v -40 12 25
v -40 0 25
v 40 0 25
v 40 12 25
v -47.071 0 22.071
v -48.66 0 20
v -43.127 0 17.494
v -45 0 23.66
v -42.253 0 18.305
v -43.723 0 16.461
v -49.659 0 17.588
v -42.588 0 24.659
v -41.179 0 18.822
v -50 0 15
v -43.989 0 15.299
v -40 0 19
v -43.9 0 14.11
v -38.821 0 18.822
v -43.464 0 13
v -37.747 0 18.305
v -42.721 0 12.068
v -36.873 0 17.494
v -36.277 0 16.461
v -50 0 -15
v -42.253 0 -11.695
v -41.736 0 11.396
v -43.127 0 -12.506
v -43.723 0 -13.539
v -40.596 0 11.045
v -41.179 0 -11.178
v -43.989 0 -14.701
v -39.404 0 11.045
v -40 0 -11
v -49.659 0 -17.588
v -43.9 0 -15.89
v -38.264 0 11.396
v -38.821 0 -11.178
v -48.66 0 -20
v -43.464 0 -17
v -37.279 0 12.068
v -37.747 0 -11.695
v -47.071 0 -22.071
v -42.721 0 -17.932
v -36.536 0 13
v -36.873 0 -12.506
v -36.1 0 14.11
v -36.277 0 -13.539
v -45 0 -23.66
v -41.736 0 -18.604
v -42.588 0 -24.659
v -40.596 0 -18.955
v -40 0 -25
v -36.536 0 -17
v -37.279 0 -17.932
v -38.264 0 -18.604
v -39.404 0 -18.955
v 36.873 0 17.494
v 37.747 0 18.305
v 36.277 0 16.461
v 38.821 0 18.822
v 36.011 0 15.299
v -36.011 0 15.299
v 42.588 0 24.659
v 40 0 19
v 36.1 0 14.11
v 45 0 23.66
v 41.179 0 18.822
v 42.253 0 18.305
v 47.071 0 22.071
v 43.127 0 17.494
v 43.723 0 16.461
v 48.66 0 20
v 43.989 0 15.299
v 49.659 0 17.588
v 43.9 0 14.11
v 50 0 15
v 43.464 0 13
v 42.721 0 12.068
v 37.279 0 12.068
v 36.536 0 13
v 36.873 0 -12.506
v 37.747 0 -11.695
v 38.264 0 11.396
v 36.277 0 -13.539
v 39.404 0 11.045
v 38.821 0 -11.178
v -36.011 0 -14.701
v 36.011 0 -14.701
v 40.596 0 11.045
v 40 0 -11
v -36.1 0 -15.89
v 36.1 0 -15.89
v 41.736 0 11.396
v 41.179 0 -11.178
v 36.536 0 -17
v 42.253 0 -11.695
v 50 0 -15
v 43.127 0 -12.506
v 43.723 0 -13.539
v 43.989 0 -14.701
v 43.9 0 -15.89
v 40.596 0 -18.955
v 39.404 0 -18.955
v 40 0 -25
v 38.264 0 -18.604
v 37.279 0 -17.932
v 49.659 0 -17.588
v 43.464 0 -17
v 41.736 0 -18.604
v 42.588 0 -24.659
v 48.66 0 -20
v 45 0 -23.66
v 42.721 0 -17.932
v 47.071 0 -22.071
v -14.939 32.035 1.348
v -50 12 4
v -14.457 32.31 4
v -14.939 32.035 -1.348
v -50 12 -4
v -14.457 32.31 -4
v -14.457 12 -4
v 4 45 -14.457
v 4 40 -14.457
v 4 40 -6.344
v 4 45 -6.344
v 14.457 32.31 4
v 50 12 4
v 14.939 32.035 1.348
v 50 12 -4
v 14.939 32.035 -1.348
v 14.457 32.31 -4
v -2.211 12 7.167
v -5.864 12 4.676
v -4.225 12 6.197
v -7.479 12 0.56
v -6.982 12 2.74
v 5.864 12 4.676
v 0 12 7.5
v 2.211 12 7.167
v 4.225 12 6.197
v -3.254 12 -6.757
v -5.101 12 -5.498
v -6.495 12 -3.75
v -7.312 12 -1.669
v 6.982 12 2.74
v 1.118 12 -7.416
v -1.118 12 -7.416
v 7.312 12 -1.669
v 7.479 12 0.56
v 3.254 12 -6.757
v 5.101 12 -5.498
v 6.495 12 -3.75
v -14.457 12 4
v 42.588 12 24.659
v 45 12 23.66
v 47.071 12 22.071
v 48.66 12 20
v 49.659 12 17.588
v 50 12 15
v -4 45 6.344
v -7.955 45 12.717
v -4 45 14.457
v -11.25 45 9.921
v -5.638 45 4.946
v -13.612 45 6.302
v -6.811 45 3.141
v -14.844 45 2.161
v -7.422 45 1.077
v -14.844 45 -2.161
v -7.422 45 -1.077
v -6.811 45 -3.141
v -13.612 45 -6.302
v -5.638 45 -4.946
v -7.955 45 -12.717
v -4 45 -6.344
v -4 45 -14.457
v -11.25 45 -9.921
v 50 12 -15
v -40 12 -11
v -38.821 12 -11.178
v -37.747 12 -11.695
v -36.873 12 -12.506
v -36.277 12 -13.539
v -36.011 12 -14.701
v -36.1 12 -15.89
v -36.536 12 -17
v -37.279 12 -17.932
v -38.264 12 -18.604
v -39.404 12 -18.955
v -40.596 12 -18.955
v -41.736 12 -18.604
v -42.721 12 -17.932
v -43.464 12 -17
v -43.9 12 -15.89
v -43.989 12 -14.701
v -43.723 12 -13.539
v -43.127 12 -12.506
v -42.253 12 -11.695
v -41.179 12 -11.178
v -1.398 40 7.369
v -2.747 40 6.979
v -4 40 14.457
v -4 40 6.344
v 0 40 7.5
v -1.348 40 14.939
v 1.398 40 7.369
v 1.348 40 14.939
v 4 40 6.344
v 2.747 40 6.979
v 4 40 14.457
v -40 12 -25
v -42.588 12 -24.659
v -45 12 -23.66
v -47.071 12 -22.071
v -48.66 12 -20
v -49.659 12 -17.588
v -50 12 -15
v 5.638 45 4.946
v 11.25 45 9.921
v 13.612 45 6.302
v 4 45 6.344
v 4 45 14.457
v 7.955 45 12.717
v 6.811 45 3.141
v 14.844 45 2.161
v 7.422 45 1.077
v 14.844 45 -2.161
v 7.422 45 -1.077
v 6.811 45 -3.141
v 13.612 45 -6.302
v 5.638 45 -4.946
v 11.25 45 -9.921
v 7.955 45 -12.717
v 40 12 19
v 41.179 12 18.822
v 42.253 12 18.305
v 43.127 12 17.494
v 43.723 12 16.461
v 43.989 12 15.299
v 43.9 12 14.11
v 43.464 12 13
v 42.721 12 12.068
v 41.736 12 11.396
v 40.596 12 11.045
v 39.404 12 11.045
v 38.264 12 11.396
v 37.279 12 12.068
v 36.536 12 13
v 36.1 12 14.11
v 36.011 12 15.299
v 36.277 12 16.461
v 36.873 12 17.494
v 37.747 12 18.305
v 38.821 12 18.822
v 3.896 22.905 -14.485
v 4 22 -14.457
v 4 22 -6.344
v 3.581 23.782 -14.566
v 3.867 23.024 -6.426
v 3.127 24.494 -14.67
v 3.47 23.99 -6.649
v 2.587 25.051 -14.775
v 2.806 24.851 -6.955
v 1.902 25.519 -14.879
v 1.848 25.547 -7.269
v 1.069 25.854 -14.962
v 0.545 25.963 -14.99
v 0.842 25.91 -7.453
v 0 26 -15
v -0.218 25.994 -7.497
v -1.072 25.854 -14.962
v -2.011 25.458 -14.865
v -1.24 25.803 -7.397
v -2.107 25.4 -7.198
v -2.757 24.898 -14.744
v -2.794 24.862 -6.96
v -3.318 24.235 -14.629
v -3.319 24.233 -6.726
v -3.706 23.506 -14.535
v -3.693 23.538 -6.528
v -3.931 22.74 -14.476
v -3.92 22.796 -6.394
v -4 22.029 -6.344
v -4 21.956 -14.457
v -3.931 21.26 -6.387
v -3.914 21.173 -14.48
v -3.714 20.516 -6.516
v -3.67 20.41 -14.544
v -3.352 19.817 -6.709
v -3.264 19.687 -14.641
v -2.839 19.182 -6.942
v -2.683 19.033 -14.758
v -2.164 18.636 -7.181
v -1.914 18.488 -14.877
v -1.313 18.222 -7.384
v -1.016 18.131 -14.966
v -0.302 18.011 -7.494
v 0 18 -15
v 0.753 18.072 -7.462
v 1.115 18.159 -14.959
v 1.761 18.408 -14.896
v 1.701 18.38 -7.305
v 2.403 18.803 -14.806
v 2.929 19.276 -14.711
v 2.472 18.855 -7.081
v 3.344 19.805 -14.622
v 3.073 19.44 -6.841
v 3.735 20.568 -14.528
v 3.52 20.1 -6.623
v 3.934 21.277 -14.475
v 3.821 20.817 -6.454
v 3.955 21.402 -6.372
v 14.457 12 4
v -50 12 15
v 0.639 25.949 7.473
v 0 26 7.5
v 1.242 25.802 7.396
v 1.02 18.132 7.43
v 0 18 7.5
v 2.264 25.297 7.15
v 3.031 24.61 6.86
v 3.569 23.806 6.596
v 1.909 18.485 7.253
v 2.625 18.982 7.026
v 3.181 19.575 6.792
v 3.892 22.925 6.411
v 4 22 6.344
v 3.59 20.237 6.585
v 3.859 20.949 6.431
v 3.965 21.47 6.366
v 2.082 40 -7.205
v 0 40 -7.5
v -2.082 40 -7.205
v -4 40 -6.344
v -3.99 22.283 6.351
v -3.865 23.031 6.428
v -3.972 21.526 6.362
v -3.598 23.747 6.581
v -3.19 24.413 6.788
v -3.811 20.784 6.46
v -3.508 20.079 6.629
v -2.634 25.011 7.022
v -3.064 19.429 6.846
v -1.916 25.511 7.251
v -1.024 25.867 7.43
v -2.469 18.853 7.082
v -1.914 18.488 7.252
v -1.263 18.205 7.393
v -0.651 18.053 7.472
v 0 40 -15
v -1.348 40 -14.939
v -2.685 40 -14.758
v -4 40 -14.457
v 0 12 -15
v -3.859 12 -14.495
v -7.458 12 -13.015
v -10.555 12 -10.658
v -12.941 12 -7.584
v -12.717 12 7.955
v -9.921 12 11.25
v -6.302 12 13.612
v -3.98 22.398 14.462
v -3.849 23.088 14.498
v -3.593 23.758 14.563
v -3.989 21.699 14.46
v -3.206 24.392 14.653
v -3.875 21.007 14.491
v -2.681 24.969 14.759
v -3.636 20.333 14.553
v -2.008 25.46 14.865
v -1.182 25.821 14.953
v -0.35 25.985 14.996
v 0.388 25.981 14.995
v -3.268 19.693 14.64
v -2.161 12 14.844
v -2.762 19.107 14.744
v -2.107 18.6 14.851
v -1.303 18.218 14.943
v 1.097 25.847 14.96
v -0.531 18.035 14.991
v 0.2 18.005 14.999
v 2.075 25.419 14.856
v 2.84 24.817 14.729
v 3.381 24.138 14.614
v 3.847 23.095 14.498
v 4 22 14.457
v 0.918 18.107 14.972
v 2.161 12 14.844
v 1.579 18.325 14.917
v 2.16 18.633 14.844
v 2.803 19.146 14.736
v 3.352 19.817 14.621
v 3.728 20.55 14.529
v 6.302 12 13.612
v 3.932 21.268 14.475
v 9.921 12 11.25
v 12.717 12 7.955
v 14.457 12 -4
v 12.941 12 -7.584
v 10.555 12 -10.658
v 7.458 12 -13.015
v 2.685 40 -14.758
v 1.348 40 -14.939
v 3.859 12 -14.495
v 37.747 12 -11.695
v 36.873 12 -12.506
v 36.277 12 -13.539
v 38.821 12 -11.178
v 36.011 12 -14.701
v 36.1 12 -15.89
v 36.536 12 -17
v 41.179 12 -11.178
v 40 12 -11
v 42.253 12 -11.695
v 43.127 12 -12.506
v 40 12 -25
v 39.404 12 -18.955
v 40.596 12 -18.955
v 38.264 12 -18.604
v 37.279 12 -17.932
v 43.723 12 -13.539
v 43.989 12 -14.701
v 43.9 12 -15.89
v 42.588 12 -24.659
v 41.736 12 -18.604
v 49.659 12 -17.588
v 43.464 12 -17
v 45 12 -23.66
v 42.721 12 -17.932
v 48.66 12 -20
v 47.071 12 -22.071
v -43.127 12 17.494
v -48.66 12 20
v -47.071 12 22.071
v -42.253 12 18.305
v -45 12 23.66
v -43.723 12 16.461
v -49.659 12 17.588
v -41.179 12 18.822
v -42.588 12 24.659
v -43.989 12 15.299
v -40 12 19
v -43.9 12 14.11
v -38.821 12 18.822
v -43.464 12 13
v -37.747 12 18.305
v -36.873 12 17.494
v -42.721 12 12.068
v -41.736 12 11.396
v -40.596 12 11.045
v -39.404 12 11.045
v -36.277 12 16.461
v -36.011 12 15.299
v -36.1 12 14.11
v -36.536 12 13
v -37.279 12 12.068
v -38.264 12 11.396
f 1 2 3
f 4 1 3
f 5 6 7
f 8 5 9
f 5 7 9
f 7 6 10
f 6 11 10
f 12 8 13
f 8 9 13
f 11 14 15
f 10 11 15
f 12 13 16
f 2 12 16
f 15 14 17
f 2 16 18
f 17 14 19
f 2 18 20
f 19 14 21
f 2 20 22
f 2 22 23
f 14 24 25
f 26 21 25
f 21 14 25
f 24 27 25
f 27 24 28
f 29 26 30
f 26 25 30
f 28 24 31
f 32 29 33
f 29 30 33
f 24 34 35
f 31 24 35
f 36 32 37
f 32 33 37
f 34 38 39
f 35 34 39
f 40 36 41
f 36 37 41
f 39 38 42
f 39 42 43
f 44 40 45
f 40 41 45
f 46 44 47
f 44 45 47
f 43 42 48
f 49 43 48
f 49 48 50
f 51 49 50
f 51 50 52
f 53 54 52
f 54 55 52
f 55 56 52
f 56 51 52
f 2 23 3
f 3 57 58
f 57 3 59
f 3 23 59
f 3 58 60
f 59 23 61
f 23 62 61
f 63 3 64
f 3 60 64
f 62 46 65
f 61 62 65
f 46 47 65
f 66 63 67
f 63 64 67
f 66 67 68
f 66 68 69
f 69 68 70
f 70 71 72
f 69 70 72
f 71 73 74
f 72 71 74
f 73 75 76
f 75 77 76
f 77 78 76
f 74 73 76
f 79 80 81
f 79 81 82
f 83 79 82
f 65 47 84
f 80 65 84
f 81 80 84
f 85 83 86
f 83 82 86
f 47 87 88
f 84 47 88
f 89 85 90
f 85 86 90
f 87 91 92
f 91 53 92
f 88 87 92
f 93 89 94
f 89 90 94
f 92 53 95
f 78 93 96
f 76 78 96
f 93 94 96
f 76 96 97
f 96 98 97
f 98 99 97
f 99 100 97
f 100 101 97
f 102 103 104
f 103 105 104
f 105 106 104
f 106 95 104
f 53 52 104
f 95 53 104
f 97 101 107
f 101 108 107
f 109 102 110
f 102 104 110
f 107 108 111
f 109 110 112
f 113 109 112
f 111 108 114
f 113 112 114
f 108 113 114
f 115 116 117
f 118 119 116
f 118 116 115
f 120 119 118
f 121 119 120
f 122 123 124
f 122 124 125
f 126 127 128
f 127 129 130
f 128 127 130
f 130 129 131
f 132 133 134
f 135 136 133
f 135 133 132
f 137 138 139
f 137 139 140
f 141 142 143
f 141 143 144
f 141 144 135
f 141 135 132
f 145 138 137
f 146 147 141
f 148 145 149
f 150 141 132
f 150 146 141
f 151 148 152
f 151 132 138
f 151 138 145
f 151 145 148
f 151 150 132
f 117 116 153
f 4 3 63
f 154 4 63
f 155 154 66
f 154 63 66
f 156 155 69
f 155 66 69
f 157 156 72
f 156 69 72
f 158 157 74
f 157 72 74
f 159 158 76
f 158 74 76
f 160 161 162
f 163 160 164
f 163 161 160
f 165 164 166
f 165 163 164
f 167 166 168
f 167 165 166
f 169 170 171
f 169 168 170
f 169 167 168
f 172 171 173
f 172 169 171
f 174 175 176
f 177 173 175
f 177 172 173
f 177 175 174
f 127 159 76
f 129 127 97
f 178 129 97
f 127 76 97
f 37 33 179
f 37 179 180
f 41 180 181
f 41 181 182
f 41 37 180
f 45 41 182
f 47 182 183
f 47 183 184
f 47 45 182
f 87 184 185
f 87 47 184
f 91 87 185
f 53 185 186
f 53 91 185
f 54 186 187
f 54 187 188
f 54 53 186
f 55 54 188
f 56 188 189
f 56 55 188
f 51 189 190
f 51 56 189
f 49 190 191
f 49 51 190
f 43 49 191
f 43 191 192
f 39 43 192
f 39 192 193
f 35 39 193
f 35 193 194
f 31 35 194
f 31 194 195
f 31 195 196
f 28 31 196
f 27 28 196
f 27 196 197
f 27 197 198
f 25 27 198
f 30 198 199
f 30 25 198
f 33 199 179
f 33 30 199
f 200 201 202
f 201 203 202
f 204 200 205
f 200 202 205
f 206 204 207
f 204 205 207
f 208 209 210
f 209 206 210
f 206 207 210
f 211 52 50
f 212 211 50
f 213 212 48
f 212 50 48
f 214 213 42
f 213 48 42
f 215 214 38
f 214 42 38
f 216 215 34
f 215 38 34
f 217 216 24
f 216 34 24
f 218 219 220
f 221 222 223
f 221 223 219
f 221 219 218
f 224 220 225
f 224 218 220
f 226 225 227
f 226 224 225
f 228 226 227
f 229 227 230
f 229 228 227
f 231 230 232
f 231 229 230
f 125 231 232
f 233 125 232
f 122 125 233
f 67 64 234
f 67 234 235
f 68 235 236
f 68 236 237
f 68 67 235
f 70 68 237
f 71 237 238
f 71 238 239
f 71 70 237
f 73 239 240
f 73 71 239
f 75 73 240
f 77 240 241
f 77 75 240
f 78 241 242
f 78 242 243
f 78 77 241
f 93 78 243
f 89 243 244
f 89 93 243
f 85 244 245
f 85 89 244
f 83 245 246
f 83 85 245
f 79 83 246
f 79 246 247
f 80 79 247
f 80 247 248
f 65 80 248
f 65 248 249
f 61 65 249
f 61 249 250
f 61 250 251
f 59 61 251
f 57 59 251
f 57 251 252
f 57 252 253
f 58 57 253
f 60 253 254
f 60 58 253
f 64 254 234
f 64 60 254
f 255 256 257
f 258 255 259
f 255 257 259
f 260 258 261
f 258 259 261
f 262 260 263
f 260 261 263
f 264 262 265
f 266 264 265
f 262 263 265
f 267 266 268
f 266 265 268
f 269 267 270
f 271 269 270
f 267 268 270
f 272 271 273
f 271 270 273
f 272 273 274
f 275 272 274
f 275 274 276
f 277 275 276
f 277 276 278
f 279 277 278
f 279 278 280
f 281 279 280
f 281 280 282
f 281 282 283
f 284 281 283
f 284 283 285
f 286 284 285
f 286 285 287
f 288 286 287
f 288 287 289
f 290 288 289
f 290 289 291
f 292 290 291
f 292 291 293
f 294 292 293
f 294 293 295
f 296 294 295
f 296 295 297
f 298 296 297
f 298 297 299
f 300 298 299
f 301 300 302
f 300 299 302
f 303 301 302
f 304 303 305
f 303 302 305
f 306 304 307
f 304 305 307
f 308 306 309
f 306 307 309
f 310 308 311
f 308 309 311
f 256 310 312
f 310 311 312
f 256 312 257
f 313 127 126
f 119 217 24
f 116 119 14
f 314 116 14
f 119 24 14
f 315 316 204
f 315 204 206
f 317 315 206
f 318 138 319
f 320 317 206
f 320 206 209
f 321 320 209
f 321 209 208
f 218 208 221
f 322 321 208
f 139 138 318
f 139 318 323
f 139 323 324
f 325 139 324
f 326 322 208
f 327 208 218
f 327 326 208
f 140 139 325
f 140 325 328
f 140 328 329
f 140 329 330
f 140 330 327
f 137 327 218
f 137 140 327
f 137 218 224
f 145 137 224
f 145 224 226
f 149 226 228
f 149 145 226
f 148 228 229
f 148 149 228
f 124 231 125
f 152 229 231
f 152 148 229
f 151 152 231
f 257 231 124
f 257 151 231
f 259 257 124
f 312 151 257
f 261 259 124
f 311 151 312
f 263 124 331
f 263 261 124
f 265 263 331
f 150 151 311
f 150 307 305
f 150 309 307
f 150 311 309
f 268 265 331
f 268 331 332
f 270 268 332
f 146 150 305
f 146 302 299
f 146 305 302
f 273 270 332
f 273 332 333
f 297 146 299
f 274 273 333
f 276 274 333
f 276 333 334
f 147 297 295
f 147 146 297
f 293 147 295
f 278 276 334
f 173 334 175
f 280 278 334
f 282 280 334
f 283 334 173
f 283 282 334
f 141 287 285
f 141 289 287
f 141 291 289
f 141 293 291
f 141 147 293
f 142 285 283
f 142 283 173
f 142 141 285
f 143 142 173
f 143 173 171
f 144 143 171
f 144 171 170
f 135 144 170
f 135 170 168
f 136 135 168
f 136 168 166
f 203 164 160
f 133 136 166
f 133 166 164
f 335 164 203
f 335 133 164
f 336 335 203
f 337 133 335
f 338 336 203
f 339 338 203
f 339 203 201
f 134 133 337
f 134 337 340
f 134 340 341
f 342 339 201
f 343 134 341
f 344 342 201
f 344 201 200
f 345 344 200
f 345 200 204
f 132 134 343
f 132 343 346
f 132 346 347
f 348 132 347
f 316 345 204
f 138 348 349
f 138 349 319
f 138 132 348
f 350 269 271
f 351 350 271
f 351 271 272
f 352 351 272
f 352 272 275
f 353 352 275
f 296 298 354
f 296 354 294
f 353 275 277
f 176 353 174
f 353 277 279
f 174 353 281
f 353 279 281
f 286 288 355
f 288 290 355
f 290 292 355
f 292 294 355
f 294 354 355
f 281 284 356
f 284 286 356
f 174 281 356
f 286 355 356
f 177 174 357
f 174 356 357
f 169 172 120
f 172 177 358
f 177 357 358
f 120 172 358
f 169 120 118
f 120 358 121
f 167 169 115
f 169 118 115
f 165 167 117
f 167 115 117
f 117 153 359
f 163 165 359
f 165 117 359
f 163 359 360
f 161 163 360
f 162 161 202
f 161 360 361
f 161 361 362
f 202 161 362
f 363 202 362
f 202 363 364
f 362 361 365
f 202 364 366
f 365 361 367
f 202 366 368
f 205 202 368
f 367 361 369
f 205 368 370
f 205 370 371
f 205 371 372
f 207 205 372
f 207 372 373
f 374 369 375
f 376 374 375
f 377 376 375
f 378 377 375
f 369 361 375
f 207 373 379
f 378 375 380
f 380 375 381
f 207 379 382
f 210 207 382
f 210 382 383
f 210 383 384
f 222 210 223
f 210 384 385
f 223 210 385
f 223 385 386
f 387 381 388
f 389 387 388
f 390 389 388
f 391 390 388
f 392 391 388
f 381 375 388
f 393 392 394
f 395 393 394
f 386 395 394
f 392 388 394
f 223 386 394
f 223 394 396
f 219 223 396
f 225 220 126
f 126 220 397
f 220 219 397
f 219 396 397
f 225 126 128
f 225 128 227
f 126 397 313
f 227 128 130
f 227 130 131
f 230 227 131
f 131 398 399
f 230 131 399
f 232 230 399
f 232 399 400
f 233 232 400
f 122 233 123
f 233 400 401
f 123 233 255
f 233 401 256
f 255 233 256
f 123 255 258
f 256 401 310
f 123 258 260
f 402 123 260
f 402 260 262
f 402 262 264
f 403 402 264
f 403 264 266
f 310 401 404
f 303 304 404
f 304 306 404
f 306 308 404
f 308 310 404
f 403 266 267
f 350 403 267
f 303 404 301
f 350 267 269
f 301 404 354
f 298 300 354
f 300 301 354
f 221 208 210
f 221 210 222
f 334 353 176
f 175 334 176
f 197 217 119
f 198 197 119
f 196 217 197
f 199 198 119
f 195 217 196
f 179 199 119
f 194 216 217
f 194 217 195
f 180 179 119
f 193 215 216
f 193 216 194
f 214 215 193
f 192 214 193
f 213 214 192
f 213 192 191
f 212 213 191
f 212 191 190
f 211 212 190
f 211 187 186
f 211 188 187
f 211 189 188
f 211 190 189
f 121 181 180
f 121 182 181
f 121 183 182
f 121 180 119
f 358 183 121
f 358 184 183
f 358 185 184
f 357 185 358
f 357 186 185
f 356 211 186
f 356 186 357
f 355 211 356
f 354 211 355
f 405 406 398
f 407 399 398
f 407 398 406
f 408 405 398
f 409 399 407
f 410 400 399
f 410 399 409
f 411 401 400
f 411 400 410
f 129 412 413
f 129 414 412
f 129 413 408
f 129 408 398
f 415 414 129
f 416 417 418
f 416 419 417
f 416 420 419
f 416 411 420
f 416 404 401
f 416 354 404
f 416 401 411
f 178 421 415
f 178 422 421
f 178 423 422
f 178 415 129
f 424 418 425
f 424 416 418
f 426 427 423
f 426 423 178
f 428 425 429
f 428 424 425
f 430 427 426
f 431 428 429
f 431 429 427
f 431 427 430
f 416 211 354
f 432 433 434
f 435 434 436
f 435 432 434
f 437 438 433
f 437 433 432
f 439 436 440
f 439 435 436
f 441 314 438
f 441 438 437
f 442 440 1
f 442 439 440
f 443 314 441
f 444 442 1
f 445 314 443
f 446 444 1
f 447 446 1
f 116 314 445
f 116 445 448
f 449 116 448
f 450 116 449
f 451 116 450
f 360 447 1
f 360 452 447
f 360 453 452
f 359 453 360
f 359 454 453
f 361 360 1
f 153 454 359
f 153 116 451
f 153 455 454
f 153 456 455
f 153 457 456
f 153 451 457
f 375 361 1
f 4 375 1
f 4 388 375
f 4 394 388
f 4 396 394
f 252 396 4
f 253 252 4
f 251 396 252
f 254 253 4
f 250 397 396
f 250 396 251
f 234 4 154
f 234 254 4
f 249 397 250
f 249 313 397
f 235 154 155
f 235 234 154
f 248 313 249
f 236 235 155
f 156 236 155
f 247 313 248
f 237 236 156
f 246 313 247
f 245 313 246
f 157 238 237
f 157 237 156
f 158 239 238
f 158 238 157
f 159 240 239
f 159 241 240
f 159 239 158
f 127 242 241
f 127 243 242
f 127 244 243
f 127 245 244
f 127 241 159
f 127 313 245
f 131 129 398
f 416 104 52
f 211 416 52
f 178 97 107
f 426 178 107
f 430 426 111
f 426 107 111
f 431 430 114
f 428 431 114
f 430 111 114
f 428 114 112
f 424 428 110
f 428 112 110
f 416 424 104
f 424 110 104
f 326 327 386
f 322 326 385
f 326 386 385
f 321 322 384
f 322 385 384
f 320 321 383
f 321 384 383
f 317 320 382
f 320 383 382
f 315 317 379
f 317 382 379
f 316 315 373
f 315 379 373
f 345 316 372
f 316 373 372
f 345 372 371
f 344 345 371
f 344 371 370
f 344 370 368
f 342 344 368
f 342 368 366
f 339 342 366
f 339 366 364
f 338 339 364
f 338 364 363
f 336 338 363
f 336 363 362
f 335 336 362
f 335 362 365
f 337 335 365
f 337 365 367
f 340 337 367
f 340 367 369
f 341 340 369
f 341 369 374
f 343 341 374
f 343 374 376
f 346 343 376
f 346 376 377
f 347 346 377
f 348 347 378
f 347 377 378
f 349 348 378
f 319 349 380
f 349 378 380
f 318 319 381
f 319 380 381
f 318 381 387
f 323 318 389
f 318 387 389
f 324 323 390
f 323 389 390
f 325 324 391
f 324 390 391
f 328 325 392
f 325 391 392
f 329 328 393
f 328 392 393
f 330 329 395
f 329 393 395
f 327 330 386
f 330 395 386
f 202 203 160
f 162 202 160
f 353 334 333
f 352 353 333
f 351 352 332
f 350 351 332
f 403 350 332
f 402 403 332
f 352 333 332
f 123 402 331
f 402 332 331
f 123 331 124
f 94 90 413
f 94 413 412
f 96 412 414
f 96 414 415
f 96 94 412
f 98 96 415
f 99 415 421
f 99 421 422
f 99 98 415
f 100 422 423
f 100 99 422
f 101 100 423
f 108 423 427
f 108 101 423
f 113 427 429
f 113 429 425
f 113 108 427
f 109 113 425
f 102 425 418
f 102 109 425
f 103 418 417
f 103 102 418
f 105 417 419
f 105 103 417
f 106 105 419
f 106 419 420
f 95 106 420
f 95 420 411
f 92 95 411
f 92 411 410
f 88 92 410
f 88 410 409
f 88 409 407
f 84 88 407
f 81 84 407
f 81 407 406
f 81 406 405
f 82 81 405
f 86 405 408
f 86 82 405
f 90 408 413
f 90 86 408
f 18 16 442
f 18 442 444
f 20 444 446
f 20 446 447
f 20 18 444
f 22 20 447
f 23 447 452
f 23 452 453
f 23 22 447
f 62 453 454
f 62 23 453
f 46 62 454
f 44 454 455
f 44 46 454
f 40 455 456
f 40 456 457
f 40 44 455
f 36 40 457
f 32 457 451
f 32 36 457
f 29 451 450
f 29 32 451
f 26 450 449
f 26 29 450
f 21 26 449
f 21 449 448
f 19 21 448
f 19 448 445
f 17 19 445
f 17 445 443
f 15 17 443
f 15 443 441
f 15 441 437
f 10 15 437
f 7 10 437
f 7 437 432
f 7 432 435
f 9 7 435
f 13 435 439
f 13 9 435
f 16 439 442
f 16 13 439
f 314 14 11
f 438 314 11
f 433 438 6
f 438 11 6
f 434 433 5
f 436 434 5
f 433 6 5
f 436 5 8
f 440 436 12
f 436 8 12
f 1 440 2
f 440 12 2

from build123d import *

# Parameters (mm, degrees)
SKETCH_1_R          = 4
EXTRUDE_1_DEPTH     = 12
SKETCH_2_R          = 15
SKETCH_2_R_2        = 7.5
EXTRUDE_2_DEPTH     = 33
SKETCH_3_R          = 4
SKETCH_3_W          = 8
SKETCH_3_H          = 5
CUT_EXTRUDE_1_DEPTH = 84.815273071
RIB_1_REACH         = 73.764
SKETCH_4_WALL_W     = 185.83828981
SKETCH_4_WALL_H     = 8


with BuildPart() as part:
    # 草图1 → 凸台-拉伸1 (new body)
    with BuildSketch(Plane(origin=(0, 0, 0), x_dir=(1, 0, 0), z_dir=(0, 1, 0))):
        with BuildLine():
            Line((-40, -25), (40, -25))
            ThreePointArc((40, -25), (47.071067812, -22.071067812), (50, -15))
            Line((50, -15), (50, 15))
            ThreePointArc((50, 15), (47.071067812, 22.071067812), (40, 25))
            Line((40, 25), (-40, 25))
            ThreePointArc((-40, 25), (-47.071067812, 22.071067812), (-50, 15))
            Line((-50, 15), (-50, -15))
            ThreePointArc((-50, -15), (-47.071067812, -22.071067812), (-40, -25))
        make_face()
        with Locations(Location((-40, 15, 0), (0, 0, 270))):
            Circle(SKETCH_1_R, mode=Mode.SUBTRACT)
        with Locations(Location((-40, -15, 0), (0, 0, 270))):
            Circle(SKETCH_1_R, mode=Mode.SUBTRACT)
        with Locations(Location((40, -15, 0), (0, 0, 270))):
            Circle(SKETCH_1_R, mode=Mode.SUBTRACT)
        with Locations(Location((40, 15, 0), (0, 0, 270))):
            Circle(SKETCH_1_R, mode=Mode.SUBTRACT)
    extrude(amount=EXTRUDE_1_DEPTH)

    # 草图2 → 凸台-拉伸2 (add)
    with BuildSketch(Plane(origin=(0, 12, 0), x_dir=(1, 0, 0), z_dir=(0, 1, 0))):
        with Locations(Location((0, 0, 0), (0, 0, 90))):
            Circle(SKETCH_2_R)
        with Locations(Location((0, 0, 0), (0, 0, 270))):
            Circle(SKETCH_2_R_2, mode=Mode.SUBTRACT)
    extrude(amount=EXTRUDE_2_DEPTH)

    # 草图3 → 切除-拉伸1 (cut, through all)
    with BuildSketch(Plane.XY.offset(25)):
        with Locations((0, 22)):
            Circle(SKETCH_3_R)
        with Locations((0, 42.5)):
            Rectangle(SKETCH_3_W, SKETCH_3_H)
    extrude(amount=-CUT_EXTRUDE_1_DEPTH, mode=Mode.SUBTRACT)

    # 草图4 wall → 筋1 (add, up to next)
    with BuildSketch(Plane(origin=(-32.5, 22, 0), x_dir=(0.868243142124, 0.496138938357, 0), z_dir=(-0.496138938357, 0.868243142124, 0)), mode=Mode.PRIVATE) as rib_1_sk1:
        Rectangle(SKETCH_4_WALL_W, SKETCH_4_WALL_H)
    rib_1_tool1 = extrude(rib_1_sk1.sketch, amount=-RIB_1_REACH, mode=Mode.PRIVATE) - part.part
    rib_1 = rib_1_tool1.solids().sort_by_distance((-32.5, 22, 0))[0]
    add(rib_1)

    # 镜向1: 筋1 across plane
    add(rib_1.mirror(Plane(origin=(0, 0, 0), x_dir=(0, 0, 1), z_dir=(1, 0, 0))))


solid = part.part
